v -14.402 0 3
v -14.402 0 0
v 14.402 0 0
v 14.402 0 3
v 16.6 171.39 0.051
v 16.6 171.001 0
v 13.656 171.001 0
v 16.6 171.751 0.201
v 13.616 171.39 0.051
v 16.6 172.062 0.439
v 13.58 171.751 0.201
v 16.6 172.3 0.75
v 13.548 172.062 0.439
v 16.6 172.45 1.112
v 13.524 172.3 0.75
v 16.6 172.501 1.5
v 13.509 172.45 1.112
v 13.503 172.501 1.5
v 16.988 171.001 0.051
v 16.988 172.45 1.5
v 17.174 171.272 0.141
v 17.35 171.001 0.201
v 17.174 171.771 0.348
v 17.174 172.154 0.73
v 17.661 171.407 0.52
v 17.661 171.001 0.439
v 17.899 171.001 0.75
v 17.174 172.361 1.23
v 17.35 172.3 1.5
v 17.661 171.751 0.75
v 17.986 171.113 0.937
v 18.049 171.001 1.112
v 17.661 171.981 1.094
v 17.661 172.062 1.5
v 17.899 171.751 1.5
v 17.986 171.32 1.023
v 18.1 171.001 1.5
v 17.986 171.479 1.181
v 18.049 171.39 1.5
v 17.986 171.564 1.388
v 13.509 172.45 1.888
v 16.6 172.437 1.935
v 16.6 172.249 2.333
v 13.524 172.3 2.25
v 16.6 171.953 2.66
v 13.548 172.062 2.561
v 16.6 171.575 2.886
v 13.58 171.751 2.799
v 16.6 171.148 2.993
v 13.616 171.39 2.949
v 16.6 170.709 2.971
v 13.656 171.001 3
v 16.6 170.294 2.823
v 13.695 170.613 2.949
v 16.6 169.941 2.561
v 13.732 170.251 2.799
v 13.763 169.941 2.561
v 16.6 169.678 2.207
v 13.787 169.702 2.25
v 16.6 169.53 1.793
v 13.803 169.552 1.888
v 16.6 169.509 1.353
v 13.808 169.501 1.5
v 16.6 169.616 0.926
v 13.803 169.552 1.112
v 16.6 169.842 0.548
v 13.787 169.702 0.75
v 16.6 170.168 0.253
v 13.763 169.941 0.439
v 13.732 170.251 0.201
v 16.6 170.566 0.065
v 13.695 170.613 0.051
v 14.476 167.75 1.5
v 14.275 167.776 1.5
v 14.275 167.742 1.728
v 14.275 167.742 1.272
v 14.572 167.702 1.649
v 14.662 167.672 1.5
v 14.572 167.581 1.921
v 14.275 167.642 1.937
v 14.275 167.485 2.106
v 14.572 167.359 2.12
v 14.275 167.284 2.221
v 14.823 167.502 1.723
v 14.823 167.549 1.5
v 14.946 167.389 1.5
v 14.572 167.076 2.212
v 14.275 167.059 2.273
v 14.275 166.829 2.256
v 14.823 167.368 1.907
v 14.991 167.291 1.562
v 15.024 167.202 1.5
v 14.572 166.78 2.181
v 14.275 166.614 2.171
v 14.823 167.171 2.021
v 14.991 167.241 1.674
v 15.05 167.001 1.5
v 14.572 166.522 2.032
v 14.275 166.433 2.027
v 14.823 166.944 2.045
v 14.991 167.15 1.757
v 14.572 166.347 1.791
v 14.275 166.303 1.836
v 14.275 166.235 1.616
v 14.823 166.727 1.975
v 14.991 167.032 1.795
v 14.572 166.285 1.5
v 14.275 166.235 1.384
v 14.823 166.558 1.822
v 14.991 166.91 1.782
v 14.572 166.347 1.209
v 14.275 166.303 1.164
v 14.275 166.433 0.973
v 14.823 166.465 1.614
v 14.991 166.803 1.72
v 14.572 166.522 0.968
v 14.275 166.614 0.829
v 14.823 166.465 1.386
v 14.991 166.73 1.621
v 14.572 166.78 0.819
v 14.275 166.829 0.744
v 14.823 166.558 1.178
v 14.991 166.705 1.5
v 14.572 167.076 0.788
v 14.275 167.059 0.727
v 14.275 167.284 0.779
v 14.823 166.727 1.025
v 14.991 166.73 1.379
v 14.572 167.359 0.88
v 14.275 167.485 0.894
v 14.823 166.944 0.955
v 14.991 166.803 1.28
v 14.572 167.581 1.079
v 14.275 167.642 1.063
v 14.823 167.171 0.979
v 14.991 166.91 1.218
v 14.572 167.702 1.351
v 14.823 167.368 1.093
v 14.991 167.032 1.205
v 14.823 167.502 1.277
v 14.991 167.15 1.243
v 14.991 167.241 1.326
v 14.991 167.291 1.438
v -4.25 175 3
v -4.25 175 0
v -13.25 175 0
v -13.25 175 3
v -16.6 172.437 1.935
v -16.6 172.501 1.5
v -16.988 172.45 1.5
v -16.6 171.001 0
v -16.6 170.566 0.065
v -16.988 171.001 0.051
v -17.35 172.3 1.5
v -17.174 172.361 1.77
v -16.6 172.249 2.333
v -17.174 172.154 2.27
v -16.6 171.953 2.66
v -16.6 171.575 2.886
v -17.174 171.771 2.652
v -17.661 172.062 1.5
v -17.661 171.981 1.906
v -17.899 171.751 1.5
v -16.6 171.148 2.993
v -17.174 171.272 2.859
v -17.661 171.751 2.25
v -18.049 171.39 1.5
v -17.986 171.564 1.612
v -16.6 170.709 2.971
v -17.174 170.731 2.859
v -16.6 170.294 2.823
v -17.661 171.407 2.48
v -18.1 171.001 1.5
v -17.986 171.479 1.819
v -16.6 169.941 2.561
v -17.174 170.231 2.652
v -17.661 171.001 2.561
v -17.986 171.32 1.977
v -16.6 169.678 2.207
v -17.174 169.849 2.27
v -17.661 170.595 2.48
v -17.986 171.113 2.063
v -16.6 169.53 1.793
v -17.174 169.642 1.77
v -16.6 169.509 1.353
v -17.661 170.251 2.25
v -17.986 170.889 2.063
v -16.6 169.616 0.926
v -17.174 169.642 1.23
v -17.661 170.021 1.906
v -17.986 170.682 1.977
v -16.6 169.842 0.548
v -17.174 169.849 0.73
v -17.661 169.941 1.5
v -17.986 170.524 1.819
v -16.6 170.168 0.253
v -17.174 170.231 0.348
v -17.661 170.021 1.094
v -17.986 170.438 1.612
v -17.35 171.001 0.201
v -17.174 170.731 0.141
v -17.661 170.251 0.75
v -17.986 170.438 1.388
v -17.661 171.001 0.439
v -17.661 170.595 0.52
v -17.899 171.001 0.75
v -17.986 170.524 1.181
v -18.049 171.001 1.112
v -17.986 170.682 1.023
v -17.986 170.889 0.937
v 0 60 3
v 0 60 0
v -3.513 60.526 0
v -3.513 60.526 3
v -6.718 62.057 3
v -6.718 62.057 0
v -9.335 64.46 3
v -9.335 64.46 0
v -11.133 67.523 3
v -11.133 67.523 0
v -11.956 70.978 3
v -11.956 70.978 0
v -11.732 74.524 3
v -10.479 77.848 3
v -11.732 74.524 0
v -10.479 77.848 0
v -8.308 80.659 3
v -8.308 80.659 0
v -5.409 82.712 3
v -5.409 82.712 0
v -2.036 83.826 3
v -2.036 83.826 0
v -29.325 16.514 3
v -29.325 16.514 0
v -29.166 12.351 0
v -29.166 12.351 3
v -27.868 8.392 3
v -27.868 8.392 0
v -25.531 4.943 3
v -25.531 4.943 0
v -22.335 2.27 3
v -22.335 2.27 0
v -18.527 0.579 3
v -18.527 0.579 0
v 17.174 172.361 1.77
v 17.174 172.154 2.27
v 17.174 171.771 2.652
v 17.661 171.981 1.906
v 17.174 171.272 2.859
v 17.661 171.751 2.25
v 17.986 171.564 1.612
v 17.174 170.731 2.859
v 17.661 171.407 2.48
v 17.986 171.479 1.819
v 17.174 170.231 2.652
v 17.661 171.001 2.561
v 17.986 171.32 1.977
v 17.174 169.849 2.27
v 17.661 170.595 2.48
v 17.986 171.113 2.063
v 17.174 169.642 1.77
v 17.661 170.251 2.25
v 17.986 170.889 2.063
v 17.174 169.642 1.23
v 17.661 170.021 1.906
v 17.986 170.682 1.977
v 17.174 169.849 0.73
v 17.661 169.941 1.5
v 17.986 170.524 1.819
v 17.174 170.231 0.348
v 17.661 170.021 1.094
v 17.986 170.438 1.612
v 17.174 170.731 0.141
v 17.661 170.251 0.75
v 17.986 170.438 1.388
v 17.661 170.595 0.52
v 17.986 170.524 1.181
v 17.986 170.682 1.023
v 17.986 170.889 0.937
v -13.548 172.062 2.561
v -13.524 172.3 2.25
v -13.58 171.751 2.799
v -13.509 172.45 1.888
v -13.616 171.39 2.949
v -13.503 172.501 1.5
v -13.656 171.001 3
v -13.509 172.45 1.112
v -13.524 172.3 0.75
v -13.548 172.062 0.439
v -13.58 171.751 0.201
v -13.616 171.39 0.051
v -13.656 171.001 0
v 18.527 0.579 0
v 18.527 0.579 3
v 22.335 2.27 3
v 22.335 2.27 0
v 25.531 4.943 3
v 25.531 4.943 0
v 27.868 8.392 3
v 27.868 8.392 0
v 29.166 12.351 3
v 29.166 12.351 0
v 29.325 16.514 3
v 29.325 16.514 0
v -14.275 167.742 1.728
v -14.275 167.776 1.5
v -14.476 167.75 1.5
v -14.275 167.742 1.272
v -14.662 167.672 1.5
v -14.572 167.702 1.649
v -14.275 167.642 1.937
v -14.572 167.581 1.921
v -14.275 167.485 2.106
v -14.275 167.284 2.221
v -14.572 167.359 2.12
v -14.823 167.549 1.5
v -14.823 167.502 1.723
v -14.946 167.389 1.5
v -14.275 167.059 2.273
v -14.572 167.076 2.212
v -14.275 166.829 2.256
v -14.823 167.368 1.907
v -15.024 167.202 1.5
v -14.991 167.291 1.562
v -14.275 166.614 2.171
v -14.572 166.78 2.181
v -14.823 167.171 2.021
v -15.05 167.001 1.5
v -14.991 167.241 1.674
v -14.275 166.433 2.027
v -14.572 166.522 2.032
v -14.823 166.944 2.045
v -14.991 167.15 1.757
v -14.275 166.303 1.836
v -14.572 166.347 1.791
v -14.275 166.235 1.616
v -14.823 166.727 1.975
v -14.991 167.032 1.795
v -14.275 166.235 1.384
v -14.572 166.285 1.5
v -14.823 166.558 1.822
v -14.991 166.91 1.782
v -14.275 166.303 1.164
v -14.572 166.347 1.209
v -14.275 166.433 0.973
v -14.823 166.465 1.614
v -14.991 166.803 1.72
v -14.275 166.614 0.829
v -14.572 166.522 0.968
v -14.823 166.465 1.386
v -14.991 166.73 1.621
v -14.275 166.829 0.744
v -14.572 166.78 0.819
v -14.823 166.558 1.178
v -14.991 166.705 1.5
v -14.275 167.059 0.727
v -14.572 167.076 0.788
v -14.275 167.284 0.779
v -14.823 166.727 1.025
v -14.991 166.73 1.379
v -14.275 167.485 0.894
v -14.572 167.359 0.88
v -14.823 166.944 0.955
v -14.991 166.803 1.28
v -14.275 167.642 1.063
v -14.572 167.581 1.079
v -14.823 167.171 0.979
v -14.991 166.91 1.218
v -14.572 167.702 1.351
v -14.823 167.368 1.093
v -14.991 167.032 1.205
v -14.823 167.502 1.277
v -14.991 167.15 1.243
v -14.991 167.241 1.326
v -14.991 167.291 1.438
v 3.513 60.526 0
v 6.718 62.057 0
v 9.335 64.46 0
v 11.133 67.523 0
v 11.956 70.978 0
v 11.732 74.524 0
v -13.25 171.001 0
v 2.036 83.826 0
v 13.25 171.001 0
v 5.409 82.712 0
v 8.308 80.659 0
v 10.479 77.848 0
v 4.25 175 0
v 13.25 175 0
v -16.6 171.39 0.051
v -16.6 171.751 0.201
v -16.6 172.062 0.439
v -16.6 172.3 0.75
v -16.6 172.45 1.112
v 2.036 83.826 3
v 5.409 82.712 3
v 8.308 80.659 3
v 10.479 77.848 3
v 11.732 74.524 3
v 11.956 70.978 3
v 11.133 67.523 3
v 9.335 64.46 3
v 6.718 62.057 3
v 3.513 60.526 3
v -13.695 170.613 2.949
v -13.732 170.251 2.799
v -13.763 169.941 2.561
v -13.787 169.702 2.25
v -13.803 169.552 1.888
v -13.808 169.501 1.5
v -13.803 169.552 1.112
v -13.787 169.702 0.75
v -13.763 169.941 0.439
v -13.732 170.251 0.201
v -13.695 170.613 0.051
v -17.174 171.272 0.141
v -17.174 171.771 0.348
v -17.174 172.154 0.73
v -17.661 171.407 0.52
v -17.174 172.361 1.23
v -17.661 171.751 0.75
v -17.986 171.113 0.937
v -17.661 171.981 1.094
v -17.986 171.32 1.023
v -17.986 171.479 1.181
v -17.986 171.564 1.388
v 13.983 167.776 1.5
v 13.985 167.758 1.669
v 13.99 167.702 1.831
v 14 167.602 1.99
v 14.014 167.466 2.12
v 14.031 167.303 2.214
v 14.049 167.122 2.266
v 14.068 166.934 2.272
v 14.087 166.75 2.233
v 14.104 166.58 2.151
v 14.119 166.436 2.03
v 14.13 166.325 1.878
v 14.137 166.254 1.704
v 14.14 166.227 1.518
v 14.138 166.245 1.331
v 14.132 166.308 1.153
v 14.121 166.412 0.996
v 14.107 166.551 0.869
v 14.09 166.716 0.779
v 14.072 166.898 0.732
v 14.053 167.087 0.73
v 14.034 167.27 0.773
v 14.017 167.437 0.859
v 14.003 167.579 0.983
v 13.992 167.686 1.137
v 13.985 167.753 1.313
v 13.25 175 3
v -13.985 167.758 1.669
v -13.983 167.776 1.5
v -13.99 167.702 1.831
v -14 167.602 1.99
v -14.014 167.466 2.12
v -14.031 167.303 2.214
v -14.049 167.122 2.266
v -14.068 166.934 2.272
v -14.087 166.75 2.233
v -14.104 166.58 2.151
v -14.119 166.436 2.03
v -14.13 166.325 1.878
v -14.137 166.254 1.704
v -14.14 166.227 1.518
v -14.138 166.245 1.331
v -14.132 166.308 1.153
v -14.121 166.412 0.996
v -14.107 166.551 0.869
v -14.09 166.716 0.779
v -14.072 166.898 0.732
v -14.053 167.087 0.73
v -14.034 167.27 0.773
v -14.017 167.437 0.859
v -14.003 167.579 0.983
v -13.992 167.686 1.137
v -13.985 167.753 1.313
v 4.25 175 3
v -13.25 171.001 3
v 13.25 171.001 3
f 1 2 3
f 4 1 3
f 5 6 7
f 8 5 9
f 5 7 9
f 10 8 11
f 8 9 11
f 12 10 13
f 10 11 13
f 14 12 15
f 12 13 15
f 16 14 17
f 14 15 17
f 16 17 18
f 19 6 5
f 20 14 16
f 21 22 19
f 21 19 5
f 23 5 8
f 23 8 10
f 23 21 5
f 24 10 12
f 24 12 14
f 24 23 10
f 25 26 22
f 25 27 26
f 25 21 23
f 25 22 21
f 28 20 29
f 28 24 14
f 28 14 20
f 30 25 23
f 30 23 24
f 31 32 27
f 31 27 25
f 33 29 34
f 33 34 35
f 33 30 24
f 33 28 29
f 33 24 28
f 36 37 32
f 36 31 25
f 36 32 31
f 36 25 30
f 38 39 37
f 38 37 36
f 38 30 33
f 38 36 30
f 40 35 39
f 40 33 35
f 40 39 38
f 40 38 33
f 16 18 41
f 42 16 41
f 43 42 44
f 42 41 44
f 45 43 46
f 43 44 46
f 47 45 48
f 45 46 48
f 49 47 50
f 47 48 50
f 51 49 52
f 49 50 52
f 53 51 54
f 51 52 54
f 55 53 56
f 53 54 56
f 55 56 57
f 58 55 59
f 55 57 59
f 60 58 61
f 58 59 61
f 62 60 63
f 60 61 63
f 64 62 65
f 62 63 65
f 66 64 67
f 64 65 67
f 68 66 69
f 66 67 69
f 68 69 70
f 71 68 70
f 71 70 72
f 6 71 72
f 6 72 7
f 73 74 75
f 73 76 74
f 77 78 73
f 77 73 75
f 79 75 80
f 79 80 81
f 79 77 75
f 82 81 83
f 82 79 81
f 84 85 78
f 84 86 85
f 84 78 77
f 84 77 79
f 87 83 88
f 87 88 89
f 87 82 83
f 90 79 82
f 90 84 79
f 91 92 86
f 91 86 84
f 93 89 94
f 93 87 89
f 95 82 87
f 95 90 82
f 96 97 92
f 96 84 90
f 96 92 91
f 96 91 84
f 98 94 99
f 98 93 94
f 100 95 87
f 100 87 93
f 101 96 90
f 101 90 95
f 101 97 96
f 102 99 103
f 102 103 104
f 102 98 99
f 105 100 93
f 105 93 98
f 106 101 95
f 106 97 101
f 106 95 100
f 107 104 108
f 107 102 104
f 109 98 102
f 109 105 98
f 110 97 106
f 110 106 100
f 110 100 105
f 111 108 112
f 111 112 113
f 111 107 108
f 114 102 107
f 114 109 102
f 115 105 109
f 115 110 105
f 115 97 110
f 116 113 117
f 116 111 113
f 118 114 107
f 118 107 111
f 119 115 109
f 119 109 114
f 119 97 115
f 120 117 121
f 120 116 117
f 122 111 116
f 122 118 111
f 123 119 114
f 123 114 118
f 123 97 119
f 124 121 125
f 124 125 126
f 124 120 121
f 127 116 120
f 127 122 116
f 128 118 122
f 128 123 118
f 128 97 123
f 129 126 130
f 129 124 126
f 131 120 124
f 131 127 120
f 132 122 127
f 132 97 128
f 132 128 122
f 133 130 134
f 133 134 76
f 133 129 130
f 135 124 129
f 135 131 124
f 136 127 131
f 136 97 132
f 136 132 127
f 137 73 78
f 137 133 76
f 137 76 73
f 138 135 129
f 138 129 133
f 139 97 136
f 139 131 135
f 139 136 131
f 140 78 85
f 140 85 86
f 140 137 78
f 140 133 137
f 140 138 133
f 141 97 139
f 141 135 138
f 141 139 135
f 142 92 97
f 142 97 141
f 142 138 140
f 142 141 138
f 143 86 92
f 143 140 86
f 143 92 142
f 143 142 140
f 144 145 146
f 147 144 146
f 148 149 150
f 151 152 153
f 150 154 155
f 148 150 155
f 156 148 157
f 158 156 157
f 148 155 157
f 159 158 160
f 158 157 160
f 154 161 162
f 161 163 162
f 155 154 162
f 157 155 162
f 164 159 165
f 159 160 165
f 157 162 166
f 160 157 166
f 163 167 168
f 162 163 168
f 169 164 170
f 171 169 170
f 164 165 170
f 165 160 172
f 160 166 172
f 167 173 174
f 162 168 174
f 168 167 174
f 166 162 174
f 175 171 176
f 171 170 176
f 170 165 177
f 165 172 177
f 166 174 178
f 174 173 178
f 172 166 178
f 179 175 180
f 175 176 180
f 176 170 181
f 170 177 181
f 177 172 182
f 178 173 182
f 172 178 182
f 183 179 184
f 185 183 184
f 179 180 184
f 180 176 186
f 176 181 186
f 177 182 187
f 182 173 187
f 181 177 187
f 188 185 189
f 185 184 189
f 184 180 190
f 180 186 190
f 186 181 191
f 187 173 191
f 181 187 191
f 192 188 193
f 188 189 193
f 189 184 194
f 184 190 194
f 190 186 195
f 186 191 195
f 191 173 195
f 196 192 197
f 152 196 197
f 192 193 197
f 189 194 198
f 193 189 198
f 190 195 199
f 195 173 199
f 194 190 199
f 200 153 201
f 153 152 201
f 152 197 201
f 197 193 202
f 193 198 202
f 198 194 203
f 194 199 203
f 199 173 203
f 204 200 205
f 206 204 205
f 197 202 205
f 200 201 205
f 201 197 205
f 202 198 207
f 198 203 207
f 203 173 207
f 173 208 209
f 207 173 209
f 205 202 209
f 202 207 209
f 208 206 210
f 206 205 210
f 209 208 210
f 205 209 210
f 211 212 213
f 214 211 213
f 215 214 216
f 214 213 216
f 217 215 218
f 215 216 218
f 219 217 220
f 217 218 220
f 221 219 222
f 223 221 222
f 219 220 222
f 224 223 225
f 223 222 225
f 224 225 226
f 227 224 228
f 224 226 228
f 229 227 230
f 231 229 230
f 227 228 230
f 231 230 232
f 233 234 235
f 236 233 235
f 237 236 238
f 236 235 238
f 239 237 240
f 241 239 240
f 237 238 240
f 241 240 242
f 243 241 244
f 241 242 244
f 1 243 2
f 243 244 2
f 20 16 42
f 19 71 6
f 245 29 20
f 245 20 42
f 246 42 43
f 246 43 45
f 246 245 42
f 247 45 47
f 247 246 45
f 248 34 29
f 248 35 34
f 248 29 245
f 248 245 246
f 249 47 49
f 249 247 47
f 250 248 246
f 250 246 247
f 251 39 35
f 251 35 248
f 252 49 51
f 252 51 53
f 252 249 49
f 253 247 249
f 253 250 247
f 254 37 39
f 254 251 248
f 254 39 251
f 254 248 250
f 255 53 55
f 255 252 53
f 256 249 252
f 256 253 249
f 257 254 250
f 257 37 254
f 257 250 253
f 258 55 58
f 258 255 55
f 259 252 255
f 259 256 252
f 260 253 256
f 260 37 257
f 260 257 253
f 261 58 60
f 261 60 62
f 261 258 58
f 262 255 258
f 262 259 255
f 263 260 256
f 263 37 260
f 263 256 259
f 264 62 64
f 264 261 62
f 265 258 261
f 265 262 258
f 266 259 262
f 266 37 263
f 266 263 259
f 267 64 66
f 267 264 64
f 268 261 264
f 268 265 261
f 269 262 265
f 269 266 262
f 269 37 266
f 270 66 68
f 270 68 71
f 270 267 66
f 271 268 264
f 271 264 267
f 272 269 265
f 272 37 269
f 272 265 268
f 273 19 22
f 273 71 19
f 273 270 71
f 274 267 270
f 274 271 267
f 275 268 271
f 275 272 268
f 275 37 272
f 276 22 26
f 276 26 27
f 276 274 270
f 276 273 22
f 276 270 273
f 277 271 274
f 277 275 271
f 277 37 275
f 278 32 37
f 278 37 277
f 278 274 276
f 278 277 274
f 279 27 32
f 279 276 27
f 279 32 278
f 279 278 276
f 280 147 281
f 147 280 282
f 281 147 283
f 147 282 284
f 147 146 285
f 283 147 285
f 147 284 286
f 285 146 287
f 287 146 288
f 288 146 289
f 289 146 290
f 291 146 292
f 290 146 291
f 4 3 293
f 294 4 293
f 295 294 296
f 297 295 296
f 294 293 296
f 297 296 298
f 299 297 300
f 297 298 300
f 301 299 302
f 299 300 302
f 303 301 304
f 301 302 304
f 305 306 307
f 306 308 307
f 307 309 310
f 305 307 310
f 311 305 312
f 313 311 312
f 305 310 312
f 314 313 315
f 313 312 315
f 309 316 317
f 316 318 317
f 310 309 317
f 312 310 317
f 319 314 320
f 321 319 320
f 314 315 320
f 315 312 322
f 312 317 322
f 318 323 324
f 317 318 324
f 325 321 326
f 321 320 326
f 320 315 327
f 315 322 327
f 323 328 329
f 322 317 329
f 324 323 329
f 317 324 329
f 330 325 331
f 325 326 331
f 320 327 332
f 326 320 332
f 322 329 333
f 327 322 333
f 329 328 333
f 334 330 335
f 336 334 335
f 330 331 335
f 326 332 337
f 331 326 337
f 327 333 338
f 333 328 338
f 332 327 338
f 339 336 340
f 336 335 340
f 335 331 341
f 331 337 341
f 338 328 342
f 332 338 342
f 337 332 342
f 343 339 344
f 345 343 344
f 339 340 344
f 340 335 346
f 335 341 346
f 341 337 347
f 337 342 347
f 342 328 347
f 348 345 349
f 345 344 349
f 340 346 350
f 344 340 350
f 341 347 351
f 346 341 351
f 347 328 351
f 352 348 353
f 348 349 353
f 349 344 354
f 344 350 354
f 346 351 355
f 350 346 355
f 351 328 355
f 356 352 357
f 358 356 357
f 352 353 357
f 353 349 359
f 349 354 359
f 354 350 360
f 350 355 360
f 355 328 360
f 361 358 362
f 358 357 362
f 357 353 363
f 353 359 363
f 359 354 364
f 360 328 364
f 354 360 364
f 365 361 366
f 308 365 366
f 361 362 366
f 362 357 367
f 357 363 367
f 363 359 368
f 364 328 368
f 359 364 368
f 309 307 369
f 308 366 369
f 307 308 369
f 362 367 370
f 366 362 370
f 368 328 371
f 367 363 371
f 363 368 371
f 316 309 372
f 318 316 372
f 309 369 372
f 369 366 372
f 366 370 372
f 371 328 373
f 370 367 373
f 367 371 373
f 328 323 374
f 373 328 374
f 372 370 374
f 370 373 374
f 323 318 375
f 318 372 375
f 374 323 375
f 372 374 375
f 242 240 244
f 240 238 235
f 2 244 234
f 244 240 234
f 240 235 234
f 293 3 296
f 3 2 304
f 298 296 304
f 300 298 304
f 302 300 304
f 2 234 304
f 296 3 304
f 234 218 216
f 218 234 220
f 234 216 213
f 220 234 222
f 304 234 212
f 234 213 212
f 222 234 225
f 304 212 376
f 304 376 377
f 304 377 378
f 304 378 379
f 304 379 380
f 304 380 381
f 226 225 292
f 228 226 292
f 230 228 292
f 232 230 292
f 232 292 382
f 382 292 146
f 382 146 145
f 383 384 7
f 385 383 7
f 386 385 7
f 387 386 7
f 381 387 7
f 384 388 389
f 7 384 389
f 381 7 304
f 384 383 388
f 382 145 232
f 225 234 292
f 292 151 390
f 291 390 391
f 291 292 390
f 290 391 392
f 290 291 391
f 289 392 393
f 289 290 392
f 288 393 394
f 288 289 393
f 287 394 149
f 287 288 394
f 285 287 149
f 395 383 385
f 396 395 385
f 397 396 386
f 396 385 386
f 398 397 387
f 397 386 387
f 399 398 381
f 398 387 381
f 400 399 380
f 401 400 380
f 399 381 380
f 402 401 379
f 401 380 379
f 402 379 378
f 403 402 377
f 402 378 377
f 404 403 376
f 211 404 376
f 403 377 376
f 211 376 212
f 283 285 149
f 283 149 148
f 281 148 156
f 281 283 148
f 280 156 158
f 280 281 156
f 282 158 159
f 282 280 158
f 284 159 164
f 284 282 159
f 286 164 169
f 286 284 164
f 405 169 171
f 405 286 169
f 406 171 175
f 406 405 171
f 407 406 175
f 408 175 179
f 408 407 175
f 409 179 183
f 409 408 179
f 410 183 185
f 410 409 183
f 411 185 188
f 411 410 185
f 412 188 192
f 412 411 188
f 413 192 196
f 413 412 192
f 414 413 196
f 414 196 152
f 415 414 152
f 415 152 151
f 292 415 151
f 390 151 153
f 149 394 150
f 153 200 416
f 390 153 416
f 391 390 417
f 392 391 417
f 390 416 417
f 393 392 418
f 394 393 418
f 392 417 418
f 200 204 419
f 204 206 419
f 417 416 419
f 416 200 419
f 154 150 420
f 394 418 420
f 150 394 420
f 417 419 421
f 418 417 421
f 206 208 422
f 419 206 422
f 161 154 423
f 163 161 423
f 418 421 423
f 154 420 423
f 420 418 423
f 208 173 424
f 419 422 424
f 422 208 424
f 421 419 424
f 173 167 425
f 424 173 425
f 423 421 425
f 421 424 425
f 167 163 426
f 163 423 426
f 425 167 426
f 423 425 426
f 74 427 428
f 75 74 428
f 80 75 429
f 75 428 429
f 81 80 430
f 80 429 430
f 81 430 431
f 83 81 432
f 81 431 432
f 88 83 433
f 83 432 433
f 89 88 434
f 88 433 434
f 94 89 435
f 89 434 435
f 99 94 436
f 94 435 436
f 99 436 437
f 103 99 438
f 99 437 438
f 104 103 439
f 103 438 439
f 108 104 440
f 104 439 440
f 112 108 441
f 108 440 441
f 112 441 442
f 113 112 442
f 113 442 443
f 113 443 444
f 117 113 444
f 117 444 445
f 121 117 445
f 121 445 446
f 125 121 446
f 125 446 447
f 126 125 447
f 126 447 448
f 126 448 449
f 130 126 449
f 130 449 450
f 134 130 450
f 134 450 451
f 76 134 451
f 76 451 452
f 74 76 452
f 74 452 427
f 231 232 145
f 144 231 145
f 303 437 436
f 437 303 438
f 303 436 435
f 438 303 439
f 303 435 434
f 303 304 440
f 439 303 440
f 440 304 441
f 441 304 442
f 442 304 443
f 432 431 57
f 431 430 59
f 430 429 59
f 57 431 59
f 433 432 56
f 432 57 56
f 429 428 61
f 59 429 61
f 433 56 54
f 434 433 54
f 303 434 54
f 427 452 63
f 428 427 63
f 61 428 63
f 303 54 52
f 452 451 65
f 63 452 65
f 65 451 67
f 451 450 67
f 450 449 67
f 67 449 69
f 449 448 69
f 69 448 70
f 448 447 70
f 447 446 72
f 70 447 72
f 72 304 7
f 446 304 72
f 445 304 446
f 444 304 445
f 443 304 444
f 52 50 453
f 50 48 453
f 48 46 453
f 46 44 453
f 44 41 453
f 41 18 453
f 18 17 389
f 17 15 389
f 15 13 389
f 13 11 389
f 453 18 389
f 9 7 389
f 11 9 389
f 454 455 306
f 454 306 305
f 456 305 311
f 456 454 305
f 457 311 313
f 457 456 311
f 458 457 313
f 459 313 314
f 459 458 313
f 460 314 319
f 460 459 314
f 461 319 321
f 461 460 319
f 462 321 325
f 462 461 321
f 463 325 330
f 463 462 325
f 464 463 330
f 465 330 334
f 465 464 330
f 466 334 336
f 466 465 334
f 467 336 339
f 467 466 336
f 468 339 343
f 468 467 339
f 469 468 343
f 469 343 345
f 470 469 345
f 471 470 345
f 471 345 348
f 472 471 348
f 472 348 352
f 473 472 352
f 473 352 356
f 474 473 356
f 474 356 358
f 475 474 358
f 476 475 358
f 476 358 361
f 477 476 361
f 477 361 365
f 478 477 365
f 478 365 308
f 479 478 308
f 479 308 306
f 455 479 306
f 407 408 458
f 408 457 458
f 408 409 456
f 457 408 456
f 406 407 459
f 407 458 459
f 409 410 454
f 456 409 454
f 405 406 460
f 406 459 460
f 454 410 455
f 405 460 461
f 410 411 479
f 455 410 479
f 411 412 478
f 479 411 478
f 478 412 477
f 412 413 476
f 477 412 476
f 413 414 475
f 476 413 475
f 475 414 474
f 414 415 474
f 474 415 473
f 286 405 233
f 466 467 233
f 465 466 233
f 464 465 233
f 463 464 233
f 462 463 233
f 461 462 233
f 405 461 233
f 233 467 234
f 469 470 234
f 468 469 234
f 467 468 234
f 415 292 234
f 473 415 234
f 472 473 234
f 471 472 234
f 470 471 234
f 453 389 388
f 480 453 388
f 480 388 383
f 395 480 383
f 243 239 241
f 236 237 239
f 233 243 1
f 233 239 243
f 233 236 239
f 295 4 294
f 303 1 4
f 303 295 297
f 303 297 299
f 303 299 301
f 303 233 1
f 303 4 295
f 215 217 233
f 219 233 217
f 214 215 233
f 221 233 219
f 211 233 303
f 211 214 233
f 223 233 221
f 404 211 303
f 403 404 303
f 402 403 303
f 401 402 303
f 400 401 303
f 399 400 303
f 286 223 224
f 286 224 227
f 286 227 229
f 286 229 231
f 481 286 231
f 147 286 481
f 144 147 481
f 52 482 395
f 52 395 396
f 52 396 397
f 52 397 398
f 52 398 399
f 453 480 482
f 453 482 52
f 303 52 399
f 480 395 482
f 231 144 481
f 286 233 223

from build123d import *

# Parameters (mm, degrees)
F1_DEPTH = 3
F4_DEPTH = 4.85
F3_R     = 0.775
F5_DEPTH = 1.8
F6_R     = 1.5
F7_R     = 0.775


with BuildPart() as f1:
    # F0 (on Top) → F1 (new body)
    with BuildSketch(Plane.XY):
        with BuildLine():
            Line((-14.4016106971, 0), (0, 0))
            Line((0, 0), (14.4016106971, 0))
            ThreePointArc((14.4016106971, 0), (25.530513069, 4.9427870661), (29.3250428137, 16.5136624004))
            Line((29.3250428137, 16.5136624004), (13.25, 175))
            Line((13.25, 175), (4.25, 175))
            Line((4.25, 175), (2.0357756631, 83.826056716))
            ThreePointArc((2.0357756631, 83.826056716), (11.9564350998, 70.9784033555), (0, 60))
            ThreePointArc((0, 60), (-11.9564350998, 70.9784033555), (-2.0357756631, 83.826056716))
            Line((-2.0357756631, 83.826056716), (-4.25, 175))
            Line((-4.25, 175), (-13.25, 175))
            Line((-13.25, 175), (-29.3250428137, 16.5136624004))
            ThreePointArc((-29.3250428137, 16.5136624004), (-25.530513069, 4.9427870661), (-14.4016106971, 0))
        make_face()
    extrude(amount=F1_DEPTH)

    # F3 (on offset) → F4 (join)
    with BuildSketch(Plane.YZ.offset(13.25)):
        with BuildLine():
            ThreePointArc((171.0013200045, 0), (172.0619801762, 0.4393398282), (172.5013200045, 1.5))
            ThreePointArc((172.5013200045, 1.5), (169.9406598327, 2.5606601718), (171.0013200045, 0))
        make_face()
    extrude(amount=F4_DEPTH)

    # F3 (on offset) → F5 (join)
    with BuildSketch(Plane.YZ.offset(13.25)):
        with Locations((167.0013200045, 1.5)):
            Circle(F3_R)
    extrude(amount=F5_DEPTH)

    # F6
    f6_edges = [f1.edges().sort_by_distance(p)[0] for p in [
        (18.1, 171.00132, 3),
    ]]
    fillet(f6_edges, radius=F6_R)

    # F7
    f7_edges = [f1.edges().sort_by_distance(p)[0] for p in [
        (15.05, 166.22632, 1.5),
    ]]
    fillet(f7_edges, radius=F7_R)

    # F8: F1 across plane


with BuildPart() as f1_1:
    add(f1.part)
    add(f1.part.mirror(Plane.YZ))


solid = f1_1.part
